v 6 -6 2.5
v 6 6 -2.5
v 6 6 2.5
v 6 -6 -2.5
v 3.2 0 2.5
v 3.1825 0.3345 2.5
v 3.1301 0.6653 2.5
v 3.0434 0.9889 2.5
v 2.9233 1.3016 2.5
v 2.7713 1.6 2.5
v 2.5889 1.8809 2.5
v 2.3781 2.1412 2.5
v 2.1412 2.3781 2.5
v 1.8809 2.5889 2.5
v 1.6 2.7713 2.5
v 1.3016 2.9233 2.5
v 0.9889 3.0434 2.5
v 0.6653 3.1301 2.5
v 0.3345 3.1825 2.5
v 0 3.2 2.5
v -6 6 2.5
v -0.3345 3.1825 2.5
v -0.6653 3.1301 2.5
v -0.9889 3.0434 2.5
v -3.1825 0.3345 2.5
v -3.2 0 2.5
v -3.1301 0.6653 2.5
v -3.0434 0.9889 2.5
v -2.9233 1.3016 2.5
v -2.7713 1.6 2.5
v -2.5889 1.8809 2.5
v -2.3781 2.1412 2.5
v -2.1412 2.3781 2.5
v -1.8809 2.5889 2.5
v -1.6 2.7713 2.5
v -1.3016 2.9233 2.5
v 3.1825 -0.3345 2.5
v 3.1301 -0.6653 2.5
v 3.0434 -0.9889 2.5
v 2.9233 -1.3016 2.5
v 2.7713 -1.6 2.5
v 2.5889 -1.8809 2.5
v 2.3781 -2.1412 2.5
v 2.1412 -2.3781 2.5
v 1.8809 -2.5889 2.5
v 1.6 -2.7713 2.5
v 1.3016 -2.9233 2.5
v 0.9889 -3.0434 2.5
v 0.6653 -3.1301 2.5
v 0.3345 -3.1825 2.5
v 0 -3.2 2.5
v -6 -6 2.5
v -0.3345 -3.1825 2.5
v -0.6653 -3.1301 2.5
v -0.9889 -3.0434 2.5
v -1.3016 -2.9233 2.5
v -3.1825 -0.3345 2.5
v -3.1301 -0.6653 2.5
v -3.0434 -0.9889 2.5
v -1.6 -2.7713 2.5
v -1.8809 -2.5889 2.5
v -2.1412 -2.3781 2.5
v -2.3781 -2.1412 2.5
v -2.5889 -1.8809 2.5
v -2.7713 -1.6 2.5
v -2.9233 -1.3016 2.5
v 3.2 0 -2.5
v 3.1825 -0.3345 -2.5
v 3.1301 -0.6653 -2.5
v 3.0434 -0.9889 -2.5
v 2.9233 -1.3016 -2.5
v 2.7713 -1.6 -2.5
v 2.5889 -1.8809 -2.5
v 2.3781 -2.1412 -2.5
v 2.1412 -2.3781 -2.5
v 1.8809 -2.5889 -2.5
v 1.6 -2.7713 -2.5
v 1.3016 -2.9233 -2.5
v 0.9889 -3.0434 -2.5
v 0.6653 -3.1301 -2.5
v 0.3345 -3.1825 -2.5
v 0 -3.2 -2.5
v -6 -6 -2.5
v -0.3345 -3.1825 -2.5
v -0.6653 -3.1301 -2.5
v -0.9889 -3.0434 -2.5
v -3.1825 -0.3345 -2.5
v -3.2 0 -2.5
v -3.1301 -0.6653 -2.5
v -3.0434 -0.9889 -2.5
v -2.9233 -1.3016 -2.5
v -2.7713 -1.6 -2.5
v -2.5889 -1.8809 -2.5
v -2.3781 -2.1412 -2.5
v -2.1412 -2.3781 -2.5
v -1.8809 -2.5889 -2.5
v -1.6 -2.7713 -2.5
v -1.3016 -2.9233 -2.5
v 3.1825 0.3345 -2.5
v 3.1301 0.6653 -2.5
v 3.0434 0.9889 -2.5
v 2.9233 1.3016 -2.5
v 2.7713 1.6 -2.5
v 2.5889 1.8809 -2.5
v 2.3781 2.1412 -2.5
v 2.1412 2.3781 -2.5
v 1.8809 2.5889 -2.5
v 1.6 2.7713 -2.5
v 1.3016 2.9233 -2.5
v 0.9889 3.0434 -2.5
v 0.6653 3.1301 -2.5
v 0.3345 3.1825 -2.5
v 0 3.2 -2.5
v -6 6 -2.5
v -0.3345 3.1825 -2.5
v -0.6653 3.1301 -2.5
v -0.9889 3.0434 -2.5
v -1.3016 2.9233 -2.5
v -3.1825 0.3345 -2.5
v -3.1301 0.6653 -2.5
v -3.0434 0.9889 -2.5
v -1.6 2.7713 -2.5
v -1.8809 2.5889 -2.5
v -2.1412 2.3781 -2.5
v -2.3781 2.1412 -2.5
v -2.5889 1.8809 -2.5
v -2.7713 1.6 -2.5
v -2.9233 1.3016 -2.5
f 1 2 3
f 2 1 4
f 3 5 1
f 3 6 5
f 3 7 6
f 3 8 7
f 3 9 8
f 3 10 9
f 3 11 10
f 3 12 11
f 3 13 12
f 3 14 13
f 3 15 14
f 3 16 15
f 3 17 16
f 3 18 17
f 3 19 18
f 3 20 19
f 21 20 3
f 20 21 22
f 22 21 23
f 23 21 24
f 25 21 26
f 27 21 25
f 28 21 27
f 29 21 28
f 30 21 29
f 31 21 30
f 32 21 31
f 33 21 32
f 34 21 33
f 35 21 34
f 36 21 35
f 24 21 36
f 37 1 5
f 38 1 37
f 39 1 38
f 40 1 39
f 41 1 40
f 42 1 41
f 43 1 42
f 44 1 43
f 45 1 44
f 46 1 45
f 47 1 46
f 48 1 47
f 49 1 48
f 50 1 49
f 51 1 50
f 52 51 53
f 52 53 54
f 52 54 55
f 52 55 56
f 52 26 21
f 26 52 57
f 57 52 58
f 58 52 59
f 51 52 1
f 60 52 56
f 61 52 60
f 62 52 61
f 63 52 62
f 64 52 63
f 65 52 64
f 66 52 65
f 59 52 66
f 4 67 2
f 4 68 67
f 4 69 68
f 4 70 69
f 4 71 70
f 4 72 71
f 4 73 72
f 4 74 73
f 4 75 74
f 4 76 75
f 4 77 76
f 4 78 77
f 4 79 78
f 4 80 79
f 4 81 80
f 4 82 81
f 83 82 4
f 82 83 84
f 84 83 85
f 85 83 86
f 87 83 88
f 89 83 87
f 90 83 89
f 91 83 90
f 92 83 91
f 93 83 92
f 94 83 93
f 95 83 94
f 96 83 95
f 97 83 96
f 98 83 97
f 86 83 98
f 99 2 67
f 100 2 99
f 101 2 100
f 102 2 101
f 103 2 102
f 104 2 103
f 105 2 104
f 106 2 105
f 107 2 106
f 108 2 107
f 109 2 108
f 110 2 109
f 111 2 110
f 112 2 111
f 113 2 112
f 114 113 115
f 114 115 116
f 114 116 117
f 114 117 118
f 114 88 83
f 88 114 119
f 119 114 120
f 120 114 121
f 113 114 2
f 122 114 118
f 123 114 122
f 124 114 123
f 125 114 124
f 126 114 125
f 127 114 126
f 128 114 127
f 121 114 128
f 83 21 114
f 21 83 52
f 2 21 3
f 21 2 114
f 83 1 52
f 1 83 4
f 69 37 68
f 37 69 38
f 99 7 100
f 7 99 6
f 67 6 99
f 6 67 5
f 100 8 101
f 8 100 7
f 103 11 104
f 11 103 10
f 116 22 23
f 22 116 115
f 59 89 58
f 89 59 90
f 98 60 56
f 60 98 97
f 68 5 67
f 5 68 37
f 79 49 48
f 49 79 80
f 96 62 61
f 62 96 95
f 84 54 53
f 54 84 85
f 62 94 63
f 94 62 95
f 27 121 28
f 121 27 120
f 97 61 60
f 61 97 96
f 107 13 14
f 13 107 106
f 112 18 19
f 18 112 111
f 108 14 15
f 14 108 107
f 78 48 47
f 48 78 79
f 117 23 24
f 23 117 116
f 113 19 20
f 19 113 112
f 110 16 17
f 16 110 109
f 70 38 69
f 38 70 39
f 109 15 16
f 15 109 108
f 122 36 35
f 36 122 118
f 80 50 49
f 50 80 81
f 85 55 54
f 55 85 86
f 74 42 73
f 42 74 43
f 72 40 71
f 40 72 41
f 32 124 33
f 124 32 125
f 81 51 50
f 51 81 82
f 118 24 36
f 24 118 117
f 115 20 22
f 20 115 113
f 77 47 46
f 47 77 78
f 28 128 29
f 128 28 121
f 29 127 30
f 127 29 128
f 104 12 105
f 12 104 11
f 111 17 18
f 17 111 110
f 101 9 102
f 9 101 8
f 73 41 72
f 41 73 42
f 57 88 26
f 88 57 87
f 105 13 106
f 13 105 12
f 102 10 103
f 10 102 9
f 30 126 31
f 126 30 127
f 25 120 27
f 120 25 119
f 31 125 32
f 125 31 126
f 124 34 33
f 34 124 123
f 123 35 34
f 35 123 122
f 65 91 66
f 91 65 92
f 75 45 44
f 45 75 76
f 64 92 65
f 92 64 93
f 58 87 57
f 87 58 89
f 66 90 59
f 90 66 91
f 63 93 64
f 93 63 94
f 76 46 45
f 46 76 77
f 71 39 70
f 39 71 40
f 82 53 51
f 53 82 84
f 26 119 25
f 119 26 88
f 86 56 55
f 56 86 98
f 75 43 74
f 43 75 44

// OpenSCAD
// Square nut.
$fn = 60;
eps = 0.02;
thread_d = 6.4;
side = 12;
thickness = 5;
difference() {
    cube([side, side, thickness], center = true);
    translate([0, 0, -thickness / 2 - eps]) cylinder(d = thread_d, h = thickness + 2 * eps);
}
